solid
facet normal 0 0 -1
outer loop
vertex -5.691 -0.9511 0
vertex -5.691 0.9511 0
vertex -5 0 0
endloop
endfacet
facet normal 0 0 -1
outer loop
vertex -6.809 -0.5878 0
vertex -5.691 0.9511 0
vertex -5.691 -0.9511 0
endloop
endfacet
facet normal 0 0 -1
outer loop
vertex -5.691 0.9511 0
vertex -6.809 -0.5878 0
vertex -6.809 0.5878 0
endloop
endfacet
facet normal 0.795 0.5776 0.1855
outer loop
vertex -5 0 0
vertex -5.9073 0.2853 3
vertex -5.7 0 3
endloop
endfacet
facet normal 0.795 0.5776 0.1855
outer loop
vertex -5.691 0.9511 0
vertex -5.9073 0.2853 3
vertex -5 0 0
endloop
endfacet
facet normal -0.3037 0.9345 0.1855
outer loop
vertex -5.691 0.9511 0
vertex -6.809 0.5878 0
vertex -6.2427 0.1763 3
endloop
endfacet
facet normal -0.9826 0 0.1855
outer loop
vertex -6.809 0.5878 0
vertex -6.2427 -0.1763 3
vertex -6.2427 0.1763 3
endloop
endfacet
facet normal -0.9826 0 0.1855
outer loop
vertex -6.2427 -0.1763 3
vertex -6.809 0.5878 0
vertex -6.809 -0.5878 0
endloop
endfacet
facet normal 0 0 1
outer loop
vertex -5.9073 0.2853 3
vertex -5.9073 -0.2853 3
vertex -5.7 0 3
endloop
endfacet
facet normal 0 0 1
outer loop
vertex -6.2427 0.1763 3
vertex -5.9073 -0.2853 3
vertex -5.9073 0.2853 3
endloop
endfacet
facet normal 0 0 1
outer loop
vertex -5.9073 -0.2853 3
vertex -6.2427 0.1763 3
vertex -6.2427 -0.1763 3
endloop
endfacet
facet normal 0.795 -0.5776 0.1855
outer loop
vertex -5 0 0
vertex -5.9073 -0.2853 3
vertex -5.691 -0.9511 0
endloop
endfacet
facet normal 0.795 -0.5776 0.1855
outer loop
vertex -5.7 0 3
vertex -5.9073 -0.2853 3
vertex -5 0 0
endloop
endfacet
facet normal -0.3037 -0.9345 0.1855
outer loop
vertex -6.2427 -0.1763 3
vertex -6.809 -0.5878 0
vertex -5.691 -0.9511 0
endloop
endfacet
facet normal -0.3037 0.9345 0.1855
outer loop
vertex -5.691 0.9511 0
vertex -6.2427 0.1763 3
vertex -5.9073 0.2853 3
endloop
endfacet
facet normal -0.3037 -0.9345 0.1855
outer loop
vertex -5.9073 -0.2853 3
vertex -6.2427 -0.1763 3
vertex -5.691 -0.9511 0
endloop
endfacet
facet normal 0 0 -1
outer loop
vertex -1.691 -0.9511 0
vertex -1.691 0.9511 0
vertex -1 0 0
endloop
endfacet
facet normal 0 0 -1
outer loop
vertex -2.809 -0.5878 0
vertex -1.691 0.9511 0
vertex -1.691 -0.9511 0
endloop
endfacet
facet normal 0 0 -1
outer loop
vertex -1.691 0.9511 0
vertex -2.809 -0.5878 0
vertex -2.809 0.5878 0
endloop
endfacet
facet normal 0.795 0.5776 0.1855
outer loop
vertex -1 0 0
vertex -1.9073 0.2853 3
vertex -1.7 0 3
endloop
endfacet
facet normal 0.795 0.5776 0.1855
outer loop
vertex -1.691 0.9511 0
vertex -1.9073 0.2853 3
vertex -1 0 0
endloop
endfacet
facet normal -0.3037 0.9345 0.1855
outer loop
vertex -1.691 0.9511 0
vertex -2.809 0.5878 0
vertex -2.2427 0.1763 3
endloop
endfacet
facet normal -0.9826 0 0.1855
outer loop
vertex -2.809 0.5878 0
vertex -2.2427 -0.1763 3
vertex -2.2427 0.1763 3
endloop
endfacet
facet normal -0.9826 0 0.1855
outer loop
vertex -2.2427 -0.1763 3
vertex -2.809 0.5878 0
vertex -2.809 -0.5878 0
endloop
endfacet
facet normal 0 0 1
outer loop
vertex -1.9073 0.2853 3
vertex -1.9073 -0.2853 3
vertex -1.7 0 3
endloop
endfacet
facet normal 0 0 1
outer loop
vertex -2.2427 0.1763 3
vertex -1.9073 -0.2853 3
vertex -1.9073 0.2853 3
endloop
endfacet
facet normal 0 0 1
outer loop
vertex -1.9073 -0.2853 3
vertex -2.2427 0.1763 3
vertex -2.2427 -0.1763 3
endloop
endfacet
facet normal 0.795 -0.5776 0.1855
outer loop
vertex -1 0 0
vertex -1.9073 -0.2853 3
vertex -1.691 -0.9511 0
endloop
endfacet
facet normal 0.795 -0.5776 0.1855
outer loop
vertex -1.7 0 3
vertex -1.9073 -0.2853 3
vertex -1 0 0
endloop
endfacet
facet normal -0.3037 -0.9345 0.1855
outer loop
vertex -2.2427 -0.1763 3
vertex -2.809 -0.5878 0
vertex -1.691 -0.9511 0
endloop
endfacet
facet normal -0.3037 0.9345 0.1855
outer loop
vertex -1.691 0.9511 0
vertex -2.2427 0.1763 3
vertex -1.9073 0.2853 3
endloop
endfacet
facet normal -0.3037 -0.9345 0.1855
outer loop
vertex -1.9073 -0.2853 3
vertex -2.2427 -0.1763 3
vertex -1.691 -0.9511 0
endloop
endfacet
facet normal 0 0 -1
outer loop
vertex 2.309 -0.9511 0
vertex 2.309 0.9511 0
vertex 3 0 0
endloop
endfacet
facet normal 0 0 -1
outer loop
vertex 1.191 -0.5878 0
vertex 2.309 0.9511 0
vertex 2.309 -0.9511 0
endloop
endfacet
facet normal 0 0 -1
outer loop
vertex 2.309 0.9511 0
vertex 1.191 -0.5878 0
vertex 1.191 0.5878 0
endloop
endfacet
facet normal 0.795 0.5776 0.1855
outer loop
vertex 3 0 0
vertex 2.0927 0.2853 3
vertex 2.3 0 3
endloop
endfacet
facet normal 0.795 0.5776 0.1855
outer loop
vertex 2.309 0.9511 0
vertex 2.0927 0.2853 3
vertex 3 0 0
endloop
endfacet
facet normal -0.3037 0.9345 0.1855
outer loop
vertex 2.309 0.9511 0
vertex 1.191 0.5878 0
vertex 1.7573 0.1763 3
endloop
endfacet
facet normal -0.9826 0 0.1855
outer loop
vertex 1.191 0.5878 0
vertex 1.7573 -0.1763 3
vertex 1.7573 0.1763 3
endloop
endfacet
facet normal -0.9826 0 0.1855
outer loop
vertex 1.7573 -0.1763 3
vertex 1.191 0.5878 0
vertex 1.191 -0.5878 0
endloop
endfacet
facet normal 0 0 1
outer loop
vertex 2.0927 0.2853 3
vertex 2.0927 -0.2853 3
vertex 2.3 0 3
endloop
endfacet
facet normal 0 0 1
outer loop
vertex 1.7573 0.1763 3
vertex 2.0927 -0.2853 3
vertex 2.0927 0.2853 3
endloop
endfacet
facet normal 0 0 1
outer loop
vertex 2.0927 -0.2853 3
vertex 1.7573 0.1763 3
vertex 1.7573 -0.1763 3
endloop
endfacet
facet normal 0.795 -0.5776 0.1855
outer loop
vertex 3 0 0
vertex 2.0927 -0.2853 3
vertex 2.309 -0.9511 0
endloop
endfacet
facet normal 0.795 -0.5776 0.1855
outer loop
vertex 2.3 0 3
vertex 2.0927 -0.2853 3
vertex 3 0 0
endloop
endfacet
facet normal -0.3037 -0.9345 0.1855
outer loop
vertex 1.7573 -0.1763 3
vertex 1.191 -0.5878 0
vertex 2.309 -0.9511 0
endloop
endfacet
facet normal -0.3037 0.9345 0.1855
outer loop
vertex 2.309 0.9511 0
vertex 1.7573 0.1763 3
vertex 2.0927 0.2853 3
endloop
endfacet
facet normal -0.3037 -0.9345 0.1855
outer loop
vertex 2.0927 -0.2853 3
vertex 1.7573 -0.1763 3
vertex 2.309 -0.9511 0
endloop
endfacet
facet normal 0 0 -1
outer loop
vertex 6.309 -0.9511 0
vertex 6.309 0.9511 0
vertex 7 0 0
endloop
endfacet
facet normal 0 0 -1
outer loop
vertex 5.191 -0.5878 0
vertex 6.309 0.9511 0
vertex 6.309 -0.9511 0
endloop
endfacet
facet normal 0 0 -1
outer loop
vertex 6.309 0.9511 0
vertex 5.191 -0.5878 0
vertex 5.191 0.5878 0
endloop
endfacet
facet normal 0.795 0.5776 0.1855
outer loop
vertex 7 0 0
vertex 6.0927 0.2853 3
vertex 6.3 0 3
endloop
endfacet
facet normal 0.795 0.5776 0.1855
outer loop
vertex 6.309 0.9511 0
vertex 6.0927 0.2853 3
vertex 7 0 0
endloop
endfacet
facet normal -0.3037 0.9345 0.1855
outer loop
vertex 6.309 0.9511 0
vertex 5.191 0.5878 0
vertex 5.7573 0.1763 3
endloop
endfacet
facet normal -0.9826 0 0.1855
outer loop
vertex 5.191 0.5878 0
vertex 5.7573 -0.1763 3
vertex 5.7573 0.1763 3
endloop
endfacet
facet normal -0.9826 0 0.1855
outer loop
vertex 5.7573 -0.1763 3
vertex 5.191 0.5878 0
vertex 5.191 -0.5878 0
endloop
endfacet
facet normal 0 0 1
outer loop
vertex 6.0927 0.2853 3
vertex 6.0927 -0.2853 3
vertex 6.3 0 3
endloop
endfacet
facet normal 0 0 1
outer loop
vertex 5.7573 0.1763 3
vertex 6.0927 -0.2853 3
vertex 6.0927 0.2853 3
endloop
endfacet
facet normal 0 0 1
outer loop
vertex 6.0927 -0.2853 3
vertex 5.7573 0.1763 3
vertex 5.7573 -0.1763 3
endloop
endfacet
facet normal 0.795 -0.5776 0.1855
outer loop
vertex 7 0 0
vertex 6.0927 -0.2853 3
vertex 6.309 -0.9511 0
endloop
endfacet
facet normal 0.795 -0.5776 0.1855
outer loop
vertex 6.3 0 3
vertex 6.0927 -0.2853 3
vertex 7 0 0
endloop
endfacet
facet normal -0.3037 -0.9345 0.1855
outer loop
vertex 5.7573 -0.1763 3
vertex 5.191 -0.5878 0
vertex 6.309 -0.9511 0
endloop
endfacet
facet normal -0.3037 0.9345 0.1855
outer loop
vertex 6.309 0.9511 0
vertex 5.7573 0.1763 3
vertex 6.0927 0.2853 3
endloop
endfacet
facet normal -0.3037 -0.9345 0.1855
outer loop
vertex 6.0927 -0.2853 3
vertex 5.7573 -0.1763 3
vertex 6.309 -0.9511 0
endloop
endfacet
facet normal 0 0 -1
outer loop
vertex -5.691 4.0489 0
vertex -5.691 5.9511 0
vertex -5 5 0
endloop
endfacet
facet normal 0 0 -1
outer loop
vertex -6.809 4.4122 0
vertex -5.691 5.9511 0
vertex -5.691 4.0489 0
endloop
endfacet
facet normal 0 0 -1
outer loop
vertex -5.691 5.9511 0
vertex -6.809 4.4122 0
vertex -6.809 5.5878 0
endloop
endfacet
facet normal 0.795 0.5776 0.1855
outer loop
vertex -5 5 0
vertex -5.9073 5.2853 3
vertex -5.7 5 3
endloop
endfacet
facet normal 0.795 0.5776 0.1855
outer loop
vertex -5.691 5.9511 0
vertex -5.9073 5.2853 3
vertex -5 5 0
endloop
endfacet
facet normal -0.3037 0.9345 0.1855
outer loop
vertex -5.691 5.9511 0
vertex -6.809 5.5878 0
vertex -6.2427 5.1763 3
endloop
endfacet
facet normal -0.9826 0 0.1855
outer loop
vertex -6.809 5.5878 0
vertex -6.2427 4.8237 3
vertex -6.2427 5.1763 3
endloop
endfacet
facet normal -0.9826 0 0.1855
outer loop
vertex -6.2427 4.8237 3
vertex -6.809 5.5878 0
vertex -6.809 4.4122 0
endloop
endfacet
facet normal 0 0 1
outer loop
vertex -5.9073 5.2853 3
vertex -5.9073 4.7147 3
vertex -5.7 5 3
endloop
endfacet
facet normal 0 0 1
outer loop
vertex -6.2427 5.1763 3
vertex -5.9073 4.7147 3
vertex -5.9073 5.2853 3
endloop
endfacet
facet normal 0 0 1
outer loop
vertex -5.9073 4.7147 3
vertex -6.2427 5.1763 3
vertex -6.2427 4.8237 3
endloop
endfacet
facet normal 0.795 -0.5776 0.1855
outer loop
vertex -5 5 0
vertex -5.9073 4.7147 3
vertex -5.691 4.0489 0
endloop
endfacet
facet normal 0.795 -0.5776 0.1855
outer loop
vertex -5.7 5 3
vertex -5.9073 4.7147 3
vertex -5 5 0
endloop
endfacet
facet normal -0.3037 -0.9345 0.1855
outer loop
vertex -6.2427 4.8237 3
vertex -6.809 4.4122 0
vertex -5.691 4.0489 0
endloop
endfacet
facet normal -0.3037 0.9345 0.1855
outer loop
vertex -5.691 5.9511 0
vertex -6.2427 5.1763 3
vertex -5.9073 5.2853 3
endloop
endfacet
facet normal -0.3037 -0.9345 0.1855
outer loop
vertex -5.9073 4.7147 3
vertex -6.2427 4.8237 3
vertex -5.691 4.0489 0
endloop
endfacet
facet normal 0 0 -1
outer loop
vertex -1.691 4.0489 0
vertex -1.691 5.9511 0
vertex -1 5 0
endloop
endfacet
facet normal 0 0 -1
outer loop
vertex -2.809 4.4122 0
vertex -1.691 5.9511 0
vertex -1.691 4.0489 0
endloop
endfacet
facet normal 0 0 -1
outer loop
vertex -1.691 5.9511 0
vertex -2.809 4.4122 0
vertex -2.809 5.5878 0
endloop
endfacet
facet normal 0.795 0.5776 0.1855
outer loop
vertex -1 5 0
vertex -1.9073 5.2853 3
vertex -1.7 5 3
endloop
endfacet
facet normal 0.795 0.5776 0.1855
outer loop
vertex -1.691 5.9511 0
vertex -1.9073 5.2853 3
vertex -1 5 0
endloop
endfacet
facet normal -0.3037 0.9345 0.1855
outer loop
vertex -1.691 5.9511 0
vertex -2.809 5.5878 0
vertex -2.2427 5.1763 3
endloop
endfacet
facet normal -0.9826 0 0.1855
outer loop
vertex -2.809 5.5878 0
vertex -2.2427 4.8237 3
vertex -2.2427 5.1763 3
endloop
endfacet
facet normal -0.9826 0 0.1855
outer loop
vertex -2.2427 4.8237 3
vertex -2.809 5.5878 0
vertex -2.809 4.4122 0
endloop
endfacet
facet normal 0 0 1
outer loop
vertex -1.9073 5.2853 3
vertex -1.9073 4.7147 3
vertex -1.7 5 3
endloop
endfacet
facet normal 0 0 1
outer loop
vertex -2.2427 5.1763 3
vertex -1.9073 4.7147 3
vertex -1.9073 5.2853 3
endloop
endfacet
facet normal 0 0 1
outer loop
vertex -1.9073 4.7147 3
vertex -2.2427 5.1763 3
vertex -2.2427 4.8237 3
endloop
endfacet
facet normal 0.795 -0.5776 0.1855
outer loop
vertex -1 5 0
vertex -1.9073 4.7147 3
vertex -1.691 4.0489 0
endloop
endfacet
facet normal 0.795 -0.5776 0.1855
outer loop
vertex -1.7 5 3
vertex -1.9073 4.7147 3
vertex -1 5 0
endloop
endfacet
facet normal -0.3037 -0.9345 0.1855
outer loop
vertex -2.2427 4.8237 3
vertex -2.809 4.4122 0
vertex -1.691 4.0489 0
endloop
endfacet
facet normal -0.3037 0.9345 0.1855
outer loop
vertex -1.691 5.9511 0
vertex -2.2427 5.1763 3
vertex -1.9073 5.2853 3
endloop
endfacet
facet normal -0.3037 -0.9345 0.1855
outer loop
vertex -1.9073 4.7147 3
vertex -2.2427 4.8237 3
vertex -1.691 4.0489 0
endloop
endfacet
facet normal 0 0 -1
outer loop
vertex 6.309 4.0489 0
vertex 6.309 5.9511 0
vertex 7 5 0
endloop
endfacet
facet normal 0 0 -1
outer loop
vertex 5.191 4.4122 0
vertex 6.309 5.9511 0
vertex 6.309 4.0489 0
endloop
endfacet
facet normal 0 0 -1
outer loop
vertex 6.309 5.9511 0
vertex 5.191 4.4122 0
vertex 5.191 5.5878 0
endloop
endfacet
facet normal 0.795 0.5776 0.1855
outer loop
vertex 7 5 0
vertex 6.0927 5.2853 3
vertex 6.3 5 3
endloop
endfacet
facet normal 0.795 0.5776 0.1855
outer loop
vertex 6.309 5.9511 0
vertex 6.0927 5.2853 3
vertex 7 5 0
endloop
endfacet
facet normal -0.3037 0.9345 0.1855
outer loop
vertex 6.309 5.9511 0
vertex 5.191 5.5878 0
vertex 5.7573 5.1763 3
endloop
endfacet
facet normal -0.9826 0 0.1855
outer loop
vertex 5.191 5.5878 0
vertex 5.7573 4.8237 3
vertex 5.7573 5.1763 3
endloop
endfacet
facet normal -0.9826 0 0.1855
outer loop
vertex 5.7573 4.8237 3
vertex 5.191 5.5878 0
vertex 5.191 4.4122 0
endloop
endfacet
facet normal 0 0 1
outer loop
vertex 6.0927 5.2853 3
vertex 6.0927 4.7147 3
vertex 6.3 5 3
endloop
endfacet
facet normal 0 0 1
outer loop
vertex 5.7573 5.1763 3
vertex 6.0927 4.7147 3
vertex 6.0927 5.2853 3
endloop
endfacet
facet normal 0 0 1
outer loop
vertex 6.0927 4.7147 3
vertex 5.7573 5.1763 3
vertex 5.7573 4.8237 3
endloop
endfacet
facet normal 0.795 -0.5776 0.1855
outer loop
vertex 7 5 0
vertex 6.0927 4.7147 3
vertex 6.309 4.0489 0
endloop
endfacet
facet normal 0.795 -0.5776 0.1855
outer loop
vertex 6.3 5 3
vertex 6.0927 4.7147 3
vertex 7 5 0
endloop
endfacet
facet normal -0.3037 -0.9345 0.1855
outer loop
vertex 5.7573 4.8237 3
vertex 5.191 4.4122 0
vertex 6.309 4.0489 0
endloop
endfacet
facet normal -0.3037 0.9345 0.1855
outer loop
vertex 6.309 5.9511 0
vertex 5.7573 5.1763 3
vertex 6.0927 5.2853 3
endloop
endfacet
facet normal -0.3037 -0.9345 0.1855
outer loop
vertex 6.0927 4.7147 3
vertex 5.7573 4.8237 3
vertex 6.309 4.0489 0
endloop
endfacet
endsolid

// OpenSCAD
union() {
	translate([-6, 0, 0]) cylinder(r1=1.0, r2=0.3, h=3);
	translate([-2, 0, 0]) cylinder(r1=1.0, r2=0.3, h=3);
	translate([2, 0, 0]) cylinder(r1=1.0, r2=0.3, h=3);
	translate([6, 0, 0]) cylinder(r1=1.0, r2=0.3, h=3);
	translate([-6, 5, 0]) cylinder(r1=1.0, r2=0.3, h=3);
	translate([-2, 5, 0]) cylinder(r1=1.0, r2=0.3, h=3);
	translate([6, 5, 0]) cylinder(r1=1.0, r2=0.3, h=3);
}
